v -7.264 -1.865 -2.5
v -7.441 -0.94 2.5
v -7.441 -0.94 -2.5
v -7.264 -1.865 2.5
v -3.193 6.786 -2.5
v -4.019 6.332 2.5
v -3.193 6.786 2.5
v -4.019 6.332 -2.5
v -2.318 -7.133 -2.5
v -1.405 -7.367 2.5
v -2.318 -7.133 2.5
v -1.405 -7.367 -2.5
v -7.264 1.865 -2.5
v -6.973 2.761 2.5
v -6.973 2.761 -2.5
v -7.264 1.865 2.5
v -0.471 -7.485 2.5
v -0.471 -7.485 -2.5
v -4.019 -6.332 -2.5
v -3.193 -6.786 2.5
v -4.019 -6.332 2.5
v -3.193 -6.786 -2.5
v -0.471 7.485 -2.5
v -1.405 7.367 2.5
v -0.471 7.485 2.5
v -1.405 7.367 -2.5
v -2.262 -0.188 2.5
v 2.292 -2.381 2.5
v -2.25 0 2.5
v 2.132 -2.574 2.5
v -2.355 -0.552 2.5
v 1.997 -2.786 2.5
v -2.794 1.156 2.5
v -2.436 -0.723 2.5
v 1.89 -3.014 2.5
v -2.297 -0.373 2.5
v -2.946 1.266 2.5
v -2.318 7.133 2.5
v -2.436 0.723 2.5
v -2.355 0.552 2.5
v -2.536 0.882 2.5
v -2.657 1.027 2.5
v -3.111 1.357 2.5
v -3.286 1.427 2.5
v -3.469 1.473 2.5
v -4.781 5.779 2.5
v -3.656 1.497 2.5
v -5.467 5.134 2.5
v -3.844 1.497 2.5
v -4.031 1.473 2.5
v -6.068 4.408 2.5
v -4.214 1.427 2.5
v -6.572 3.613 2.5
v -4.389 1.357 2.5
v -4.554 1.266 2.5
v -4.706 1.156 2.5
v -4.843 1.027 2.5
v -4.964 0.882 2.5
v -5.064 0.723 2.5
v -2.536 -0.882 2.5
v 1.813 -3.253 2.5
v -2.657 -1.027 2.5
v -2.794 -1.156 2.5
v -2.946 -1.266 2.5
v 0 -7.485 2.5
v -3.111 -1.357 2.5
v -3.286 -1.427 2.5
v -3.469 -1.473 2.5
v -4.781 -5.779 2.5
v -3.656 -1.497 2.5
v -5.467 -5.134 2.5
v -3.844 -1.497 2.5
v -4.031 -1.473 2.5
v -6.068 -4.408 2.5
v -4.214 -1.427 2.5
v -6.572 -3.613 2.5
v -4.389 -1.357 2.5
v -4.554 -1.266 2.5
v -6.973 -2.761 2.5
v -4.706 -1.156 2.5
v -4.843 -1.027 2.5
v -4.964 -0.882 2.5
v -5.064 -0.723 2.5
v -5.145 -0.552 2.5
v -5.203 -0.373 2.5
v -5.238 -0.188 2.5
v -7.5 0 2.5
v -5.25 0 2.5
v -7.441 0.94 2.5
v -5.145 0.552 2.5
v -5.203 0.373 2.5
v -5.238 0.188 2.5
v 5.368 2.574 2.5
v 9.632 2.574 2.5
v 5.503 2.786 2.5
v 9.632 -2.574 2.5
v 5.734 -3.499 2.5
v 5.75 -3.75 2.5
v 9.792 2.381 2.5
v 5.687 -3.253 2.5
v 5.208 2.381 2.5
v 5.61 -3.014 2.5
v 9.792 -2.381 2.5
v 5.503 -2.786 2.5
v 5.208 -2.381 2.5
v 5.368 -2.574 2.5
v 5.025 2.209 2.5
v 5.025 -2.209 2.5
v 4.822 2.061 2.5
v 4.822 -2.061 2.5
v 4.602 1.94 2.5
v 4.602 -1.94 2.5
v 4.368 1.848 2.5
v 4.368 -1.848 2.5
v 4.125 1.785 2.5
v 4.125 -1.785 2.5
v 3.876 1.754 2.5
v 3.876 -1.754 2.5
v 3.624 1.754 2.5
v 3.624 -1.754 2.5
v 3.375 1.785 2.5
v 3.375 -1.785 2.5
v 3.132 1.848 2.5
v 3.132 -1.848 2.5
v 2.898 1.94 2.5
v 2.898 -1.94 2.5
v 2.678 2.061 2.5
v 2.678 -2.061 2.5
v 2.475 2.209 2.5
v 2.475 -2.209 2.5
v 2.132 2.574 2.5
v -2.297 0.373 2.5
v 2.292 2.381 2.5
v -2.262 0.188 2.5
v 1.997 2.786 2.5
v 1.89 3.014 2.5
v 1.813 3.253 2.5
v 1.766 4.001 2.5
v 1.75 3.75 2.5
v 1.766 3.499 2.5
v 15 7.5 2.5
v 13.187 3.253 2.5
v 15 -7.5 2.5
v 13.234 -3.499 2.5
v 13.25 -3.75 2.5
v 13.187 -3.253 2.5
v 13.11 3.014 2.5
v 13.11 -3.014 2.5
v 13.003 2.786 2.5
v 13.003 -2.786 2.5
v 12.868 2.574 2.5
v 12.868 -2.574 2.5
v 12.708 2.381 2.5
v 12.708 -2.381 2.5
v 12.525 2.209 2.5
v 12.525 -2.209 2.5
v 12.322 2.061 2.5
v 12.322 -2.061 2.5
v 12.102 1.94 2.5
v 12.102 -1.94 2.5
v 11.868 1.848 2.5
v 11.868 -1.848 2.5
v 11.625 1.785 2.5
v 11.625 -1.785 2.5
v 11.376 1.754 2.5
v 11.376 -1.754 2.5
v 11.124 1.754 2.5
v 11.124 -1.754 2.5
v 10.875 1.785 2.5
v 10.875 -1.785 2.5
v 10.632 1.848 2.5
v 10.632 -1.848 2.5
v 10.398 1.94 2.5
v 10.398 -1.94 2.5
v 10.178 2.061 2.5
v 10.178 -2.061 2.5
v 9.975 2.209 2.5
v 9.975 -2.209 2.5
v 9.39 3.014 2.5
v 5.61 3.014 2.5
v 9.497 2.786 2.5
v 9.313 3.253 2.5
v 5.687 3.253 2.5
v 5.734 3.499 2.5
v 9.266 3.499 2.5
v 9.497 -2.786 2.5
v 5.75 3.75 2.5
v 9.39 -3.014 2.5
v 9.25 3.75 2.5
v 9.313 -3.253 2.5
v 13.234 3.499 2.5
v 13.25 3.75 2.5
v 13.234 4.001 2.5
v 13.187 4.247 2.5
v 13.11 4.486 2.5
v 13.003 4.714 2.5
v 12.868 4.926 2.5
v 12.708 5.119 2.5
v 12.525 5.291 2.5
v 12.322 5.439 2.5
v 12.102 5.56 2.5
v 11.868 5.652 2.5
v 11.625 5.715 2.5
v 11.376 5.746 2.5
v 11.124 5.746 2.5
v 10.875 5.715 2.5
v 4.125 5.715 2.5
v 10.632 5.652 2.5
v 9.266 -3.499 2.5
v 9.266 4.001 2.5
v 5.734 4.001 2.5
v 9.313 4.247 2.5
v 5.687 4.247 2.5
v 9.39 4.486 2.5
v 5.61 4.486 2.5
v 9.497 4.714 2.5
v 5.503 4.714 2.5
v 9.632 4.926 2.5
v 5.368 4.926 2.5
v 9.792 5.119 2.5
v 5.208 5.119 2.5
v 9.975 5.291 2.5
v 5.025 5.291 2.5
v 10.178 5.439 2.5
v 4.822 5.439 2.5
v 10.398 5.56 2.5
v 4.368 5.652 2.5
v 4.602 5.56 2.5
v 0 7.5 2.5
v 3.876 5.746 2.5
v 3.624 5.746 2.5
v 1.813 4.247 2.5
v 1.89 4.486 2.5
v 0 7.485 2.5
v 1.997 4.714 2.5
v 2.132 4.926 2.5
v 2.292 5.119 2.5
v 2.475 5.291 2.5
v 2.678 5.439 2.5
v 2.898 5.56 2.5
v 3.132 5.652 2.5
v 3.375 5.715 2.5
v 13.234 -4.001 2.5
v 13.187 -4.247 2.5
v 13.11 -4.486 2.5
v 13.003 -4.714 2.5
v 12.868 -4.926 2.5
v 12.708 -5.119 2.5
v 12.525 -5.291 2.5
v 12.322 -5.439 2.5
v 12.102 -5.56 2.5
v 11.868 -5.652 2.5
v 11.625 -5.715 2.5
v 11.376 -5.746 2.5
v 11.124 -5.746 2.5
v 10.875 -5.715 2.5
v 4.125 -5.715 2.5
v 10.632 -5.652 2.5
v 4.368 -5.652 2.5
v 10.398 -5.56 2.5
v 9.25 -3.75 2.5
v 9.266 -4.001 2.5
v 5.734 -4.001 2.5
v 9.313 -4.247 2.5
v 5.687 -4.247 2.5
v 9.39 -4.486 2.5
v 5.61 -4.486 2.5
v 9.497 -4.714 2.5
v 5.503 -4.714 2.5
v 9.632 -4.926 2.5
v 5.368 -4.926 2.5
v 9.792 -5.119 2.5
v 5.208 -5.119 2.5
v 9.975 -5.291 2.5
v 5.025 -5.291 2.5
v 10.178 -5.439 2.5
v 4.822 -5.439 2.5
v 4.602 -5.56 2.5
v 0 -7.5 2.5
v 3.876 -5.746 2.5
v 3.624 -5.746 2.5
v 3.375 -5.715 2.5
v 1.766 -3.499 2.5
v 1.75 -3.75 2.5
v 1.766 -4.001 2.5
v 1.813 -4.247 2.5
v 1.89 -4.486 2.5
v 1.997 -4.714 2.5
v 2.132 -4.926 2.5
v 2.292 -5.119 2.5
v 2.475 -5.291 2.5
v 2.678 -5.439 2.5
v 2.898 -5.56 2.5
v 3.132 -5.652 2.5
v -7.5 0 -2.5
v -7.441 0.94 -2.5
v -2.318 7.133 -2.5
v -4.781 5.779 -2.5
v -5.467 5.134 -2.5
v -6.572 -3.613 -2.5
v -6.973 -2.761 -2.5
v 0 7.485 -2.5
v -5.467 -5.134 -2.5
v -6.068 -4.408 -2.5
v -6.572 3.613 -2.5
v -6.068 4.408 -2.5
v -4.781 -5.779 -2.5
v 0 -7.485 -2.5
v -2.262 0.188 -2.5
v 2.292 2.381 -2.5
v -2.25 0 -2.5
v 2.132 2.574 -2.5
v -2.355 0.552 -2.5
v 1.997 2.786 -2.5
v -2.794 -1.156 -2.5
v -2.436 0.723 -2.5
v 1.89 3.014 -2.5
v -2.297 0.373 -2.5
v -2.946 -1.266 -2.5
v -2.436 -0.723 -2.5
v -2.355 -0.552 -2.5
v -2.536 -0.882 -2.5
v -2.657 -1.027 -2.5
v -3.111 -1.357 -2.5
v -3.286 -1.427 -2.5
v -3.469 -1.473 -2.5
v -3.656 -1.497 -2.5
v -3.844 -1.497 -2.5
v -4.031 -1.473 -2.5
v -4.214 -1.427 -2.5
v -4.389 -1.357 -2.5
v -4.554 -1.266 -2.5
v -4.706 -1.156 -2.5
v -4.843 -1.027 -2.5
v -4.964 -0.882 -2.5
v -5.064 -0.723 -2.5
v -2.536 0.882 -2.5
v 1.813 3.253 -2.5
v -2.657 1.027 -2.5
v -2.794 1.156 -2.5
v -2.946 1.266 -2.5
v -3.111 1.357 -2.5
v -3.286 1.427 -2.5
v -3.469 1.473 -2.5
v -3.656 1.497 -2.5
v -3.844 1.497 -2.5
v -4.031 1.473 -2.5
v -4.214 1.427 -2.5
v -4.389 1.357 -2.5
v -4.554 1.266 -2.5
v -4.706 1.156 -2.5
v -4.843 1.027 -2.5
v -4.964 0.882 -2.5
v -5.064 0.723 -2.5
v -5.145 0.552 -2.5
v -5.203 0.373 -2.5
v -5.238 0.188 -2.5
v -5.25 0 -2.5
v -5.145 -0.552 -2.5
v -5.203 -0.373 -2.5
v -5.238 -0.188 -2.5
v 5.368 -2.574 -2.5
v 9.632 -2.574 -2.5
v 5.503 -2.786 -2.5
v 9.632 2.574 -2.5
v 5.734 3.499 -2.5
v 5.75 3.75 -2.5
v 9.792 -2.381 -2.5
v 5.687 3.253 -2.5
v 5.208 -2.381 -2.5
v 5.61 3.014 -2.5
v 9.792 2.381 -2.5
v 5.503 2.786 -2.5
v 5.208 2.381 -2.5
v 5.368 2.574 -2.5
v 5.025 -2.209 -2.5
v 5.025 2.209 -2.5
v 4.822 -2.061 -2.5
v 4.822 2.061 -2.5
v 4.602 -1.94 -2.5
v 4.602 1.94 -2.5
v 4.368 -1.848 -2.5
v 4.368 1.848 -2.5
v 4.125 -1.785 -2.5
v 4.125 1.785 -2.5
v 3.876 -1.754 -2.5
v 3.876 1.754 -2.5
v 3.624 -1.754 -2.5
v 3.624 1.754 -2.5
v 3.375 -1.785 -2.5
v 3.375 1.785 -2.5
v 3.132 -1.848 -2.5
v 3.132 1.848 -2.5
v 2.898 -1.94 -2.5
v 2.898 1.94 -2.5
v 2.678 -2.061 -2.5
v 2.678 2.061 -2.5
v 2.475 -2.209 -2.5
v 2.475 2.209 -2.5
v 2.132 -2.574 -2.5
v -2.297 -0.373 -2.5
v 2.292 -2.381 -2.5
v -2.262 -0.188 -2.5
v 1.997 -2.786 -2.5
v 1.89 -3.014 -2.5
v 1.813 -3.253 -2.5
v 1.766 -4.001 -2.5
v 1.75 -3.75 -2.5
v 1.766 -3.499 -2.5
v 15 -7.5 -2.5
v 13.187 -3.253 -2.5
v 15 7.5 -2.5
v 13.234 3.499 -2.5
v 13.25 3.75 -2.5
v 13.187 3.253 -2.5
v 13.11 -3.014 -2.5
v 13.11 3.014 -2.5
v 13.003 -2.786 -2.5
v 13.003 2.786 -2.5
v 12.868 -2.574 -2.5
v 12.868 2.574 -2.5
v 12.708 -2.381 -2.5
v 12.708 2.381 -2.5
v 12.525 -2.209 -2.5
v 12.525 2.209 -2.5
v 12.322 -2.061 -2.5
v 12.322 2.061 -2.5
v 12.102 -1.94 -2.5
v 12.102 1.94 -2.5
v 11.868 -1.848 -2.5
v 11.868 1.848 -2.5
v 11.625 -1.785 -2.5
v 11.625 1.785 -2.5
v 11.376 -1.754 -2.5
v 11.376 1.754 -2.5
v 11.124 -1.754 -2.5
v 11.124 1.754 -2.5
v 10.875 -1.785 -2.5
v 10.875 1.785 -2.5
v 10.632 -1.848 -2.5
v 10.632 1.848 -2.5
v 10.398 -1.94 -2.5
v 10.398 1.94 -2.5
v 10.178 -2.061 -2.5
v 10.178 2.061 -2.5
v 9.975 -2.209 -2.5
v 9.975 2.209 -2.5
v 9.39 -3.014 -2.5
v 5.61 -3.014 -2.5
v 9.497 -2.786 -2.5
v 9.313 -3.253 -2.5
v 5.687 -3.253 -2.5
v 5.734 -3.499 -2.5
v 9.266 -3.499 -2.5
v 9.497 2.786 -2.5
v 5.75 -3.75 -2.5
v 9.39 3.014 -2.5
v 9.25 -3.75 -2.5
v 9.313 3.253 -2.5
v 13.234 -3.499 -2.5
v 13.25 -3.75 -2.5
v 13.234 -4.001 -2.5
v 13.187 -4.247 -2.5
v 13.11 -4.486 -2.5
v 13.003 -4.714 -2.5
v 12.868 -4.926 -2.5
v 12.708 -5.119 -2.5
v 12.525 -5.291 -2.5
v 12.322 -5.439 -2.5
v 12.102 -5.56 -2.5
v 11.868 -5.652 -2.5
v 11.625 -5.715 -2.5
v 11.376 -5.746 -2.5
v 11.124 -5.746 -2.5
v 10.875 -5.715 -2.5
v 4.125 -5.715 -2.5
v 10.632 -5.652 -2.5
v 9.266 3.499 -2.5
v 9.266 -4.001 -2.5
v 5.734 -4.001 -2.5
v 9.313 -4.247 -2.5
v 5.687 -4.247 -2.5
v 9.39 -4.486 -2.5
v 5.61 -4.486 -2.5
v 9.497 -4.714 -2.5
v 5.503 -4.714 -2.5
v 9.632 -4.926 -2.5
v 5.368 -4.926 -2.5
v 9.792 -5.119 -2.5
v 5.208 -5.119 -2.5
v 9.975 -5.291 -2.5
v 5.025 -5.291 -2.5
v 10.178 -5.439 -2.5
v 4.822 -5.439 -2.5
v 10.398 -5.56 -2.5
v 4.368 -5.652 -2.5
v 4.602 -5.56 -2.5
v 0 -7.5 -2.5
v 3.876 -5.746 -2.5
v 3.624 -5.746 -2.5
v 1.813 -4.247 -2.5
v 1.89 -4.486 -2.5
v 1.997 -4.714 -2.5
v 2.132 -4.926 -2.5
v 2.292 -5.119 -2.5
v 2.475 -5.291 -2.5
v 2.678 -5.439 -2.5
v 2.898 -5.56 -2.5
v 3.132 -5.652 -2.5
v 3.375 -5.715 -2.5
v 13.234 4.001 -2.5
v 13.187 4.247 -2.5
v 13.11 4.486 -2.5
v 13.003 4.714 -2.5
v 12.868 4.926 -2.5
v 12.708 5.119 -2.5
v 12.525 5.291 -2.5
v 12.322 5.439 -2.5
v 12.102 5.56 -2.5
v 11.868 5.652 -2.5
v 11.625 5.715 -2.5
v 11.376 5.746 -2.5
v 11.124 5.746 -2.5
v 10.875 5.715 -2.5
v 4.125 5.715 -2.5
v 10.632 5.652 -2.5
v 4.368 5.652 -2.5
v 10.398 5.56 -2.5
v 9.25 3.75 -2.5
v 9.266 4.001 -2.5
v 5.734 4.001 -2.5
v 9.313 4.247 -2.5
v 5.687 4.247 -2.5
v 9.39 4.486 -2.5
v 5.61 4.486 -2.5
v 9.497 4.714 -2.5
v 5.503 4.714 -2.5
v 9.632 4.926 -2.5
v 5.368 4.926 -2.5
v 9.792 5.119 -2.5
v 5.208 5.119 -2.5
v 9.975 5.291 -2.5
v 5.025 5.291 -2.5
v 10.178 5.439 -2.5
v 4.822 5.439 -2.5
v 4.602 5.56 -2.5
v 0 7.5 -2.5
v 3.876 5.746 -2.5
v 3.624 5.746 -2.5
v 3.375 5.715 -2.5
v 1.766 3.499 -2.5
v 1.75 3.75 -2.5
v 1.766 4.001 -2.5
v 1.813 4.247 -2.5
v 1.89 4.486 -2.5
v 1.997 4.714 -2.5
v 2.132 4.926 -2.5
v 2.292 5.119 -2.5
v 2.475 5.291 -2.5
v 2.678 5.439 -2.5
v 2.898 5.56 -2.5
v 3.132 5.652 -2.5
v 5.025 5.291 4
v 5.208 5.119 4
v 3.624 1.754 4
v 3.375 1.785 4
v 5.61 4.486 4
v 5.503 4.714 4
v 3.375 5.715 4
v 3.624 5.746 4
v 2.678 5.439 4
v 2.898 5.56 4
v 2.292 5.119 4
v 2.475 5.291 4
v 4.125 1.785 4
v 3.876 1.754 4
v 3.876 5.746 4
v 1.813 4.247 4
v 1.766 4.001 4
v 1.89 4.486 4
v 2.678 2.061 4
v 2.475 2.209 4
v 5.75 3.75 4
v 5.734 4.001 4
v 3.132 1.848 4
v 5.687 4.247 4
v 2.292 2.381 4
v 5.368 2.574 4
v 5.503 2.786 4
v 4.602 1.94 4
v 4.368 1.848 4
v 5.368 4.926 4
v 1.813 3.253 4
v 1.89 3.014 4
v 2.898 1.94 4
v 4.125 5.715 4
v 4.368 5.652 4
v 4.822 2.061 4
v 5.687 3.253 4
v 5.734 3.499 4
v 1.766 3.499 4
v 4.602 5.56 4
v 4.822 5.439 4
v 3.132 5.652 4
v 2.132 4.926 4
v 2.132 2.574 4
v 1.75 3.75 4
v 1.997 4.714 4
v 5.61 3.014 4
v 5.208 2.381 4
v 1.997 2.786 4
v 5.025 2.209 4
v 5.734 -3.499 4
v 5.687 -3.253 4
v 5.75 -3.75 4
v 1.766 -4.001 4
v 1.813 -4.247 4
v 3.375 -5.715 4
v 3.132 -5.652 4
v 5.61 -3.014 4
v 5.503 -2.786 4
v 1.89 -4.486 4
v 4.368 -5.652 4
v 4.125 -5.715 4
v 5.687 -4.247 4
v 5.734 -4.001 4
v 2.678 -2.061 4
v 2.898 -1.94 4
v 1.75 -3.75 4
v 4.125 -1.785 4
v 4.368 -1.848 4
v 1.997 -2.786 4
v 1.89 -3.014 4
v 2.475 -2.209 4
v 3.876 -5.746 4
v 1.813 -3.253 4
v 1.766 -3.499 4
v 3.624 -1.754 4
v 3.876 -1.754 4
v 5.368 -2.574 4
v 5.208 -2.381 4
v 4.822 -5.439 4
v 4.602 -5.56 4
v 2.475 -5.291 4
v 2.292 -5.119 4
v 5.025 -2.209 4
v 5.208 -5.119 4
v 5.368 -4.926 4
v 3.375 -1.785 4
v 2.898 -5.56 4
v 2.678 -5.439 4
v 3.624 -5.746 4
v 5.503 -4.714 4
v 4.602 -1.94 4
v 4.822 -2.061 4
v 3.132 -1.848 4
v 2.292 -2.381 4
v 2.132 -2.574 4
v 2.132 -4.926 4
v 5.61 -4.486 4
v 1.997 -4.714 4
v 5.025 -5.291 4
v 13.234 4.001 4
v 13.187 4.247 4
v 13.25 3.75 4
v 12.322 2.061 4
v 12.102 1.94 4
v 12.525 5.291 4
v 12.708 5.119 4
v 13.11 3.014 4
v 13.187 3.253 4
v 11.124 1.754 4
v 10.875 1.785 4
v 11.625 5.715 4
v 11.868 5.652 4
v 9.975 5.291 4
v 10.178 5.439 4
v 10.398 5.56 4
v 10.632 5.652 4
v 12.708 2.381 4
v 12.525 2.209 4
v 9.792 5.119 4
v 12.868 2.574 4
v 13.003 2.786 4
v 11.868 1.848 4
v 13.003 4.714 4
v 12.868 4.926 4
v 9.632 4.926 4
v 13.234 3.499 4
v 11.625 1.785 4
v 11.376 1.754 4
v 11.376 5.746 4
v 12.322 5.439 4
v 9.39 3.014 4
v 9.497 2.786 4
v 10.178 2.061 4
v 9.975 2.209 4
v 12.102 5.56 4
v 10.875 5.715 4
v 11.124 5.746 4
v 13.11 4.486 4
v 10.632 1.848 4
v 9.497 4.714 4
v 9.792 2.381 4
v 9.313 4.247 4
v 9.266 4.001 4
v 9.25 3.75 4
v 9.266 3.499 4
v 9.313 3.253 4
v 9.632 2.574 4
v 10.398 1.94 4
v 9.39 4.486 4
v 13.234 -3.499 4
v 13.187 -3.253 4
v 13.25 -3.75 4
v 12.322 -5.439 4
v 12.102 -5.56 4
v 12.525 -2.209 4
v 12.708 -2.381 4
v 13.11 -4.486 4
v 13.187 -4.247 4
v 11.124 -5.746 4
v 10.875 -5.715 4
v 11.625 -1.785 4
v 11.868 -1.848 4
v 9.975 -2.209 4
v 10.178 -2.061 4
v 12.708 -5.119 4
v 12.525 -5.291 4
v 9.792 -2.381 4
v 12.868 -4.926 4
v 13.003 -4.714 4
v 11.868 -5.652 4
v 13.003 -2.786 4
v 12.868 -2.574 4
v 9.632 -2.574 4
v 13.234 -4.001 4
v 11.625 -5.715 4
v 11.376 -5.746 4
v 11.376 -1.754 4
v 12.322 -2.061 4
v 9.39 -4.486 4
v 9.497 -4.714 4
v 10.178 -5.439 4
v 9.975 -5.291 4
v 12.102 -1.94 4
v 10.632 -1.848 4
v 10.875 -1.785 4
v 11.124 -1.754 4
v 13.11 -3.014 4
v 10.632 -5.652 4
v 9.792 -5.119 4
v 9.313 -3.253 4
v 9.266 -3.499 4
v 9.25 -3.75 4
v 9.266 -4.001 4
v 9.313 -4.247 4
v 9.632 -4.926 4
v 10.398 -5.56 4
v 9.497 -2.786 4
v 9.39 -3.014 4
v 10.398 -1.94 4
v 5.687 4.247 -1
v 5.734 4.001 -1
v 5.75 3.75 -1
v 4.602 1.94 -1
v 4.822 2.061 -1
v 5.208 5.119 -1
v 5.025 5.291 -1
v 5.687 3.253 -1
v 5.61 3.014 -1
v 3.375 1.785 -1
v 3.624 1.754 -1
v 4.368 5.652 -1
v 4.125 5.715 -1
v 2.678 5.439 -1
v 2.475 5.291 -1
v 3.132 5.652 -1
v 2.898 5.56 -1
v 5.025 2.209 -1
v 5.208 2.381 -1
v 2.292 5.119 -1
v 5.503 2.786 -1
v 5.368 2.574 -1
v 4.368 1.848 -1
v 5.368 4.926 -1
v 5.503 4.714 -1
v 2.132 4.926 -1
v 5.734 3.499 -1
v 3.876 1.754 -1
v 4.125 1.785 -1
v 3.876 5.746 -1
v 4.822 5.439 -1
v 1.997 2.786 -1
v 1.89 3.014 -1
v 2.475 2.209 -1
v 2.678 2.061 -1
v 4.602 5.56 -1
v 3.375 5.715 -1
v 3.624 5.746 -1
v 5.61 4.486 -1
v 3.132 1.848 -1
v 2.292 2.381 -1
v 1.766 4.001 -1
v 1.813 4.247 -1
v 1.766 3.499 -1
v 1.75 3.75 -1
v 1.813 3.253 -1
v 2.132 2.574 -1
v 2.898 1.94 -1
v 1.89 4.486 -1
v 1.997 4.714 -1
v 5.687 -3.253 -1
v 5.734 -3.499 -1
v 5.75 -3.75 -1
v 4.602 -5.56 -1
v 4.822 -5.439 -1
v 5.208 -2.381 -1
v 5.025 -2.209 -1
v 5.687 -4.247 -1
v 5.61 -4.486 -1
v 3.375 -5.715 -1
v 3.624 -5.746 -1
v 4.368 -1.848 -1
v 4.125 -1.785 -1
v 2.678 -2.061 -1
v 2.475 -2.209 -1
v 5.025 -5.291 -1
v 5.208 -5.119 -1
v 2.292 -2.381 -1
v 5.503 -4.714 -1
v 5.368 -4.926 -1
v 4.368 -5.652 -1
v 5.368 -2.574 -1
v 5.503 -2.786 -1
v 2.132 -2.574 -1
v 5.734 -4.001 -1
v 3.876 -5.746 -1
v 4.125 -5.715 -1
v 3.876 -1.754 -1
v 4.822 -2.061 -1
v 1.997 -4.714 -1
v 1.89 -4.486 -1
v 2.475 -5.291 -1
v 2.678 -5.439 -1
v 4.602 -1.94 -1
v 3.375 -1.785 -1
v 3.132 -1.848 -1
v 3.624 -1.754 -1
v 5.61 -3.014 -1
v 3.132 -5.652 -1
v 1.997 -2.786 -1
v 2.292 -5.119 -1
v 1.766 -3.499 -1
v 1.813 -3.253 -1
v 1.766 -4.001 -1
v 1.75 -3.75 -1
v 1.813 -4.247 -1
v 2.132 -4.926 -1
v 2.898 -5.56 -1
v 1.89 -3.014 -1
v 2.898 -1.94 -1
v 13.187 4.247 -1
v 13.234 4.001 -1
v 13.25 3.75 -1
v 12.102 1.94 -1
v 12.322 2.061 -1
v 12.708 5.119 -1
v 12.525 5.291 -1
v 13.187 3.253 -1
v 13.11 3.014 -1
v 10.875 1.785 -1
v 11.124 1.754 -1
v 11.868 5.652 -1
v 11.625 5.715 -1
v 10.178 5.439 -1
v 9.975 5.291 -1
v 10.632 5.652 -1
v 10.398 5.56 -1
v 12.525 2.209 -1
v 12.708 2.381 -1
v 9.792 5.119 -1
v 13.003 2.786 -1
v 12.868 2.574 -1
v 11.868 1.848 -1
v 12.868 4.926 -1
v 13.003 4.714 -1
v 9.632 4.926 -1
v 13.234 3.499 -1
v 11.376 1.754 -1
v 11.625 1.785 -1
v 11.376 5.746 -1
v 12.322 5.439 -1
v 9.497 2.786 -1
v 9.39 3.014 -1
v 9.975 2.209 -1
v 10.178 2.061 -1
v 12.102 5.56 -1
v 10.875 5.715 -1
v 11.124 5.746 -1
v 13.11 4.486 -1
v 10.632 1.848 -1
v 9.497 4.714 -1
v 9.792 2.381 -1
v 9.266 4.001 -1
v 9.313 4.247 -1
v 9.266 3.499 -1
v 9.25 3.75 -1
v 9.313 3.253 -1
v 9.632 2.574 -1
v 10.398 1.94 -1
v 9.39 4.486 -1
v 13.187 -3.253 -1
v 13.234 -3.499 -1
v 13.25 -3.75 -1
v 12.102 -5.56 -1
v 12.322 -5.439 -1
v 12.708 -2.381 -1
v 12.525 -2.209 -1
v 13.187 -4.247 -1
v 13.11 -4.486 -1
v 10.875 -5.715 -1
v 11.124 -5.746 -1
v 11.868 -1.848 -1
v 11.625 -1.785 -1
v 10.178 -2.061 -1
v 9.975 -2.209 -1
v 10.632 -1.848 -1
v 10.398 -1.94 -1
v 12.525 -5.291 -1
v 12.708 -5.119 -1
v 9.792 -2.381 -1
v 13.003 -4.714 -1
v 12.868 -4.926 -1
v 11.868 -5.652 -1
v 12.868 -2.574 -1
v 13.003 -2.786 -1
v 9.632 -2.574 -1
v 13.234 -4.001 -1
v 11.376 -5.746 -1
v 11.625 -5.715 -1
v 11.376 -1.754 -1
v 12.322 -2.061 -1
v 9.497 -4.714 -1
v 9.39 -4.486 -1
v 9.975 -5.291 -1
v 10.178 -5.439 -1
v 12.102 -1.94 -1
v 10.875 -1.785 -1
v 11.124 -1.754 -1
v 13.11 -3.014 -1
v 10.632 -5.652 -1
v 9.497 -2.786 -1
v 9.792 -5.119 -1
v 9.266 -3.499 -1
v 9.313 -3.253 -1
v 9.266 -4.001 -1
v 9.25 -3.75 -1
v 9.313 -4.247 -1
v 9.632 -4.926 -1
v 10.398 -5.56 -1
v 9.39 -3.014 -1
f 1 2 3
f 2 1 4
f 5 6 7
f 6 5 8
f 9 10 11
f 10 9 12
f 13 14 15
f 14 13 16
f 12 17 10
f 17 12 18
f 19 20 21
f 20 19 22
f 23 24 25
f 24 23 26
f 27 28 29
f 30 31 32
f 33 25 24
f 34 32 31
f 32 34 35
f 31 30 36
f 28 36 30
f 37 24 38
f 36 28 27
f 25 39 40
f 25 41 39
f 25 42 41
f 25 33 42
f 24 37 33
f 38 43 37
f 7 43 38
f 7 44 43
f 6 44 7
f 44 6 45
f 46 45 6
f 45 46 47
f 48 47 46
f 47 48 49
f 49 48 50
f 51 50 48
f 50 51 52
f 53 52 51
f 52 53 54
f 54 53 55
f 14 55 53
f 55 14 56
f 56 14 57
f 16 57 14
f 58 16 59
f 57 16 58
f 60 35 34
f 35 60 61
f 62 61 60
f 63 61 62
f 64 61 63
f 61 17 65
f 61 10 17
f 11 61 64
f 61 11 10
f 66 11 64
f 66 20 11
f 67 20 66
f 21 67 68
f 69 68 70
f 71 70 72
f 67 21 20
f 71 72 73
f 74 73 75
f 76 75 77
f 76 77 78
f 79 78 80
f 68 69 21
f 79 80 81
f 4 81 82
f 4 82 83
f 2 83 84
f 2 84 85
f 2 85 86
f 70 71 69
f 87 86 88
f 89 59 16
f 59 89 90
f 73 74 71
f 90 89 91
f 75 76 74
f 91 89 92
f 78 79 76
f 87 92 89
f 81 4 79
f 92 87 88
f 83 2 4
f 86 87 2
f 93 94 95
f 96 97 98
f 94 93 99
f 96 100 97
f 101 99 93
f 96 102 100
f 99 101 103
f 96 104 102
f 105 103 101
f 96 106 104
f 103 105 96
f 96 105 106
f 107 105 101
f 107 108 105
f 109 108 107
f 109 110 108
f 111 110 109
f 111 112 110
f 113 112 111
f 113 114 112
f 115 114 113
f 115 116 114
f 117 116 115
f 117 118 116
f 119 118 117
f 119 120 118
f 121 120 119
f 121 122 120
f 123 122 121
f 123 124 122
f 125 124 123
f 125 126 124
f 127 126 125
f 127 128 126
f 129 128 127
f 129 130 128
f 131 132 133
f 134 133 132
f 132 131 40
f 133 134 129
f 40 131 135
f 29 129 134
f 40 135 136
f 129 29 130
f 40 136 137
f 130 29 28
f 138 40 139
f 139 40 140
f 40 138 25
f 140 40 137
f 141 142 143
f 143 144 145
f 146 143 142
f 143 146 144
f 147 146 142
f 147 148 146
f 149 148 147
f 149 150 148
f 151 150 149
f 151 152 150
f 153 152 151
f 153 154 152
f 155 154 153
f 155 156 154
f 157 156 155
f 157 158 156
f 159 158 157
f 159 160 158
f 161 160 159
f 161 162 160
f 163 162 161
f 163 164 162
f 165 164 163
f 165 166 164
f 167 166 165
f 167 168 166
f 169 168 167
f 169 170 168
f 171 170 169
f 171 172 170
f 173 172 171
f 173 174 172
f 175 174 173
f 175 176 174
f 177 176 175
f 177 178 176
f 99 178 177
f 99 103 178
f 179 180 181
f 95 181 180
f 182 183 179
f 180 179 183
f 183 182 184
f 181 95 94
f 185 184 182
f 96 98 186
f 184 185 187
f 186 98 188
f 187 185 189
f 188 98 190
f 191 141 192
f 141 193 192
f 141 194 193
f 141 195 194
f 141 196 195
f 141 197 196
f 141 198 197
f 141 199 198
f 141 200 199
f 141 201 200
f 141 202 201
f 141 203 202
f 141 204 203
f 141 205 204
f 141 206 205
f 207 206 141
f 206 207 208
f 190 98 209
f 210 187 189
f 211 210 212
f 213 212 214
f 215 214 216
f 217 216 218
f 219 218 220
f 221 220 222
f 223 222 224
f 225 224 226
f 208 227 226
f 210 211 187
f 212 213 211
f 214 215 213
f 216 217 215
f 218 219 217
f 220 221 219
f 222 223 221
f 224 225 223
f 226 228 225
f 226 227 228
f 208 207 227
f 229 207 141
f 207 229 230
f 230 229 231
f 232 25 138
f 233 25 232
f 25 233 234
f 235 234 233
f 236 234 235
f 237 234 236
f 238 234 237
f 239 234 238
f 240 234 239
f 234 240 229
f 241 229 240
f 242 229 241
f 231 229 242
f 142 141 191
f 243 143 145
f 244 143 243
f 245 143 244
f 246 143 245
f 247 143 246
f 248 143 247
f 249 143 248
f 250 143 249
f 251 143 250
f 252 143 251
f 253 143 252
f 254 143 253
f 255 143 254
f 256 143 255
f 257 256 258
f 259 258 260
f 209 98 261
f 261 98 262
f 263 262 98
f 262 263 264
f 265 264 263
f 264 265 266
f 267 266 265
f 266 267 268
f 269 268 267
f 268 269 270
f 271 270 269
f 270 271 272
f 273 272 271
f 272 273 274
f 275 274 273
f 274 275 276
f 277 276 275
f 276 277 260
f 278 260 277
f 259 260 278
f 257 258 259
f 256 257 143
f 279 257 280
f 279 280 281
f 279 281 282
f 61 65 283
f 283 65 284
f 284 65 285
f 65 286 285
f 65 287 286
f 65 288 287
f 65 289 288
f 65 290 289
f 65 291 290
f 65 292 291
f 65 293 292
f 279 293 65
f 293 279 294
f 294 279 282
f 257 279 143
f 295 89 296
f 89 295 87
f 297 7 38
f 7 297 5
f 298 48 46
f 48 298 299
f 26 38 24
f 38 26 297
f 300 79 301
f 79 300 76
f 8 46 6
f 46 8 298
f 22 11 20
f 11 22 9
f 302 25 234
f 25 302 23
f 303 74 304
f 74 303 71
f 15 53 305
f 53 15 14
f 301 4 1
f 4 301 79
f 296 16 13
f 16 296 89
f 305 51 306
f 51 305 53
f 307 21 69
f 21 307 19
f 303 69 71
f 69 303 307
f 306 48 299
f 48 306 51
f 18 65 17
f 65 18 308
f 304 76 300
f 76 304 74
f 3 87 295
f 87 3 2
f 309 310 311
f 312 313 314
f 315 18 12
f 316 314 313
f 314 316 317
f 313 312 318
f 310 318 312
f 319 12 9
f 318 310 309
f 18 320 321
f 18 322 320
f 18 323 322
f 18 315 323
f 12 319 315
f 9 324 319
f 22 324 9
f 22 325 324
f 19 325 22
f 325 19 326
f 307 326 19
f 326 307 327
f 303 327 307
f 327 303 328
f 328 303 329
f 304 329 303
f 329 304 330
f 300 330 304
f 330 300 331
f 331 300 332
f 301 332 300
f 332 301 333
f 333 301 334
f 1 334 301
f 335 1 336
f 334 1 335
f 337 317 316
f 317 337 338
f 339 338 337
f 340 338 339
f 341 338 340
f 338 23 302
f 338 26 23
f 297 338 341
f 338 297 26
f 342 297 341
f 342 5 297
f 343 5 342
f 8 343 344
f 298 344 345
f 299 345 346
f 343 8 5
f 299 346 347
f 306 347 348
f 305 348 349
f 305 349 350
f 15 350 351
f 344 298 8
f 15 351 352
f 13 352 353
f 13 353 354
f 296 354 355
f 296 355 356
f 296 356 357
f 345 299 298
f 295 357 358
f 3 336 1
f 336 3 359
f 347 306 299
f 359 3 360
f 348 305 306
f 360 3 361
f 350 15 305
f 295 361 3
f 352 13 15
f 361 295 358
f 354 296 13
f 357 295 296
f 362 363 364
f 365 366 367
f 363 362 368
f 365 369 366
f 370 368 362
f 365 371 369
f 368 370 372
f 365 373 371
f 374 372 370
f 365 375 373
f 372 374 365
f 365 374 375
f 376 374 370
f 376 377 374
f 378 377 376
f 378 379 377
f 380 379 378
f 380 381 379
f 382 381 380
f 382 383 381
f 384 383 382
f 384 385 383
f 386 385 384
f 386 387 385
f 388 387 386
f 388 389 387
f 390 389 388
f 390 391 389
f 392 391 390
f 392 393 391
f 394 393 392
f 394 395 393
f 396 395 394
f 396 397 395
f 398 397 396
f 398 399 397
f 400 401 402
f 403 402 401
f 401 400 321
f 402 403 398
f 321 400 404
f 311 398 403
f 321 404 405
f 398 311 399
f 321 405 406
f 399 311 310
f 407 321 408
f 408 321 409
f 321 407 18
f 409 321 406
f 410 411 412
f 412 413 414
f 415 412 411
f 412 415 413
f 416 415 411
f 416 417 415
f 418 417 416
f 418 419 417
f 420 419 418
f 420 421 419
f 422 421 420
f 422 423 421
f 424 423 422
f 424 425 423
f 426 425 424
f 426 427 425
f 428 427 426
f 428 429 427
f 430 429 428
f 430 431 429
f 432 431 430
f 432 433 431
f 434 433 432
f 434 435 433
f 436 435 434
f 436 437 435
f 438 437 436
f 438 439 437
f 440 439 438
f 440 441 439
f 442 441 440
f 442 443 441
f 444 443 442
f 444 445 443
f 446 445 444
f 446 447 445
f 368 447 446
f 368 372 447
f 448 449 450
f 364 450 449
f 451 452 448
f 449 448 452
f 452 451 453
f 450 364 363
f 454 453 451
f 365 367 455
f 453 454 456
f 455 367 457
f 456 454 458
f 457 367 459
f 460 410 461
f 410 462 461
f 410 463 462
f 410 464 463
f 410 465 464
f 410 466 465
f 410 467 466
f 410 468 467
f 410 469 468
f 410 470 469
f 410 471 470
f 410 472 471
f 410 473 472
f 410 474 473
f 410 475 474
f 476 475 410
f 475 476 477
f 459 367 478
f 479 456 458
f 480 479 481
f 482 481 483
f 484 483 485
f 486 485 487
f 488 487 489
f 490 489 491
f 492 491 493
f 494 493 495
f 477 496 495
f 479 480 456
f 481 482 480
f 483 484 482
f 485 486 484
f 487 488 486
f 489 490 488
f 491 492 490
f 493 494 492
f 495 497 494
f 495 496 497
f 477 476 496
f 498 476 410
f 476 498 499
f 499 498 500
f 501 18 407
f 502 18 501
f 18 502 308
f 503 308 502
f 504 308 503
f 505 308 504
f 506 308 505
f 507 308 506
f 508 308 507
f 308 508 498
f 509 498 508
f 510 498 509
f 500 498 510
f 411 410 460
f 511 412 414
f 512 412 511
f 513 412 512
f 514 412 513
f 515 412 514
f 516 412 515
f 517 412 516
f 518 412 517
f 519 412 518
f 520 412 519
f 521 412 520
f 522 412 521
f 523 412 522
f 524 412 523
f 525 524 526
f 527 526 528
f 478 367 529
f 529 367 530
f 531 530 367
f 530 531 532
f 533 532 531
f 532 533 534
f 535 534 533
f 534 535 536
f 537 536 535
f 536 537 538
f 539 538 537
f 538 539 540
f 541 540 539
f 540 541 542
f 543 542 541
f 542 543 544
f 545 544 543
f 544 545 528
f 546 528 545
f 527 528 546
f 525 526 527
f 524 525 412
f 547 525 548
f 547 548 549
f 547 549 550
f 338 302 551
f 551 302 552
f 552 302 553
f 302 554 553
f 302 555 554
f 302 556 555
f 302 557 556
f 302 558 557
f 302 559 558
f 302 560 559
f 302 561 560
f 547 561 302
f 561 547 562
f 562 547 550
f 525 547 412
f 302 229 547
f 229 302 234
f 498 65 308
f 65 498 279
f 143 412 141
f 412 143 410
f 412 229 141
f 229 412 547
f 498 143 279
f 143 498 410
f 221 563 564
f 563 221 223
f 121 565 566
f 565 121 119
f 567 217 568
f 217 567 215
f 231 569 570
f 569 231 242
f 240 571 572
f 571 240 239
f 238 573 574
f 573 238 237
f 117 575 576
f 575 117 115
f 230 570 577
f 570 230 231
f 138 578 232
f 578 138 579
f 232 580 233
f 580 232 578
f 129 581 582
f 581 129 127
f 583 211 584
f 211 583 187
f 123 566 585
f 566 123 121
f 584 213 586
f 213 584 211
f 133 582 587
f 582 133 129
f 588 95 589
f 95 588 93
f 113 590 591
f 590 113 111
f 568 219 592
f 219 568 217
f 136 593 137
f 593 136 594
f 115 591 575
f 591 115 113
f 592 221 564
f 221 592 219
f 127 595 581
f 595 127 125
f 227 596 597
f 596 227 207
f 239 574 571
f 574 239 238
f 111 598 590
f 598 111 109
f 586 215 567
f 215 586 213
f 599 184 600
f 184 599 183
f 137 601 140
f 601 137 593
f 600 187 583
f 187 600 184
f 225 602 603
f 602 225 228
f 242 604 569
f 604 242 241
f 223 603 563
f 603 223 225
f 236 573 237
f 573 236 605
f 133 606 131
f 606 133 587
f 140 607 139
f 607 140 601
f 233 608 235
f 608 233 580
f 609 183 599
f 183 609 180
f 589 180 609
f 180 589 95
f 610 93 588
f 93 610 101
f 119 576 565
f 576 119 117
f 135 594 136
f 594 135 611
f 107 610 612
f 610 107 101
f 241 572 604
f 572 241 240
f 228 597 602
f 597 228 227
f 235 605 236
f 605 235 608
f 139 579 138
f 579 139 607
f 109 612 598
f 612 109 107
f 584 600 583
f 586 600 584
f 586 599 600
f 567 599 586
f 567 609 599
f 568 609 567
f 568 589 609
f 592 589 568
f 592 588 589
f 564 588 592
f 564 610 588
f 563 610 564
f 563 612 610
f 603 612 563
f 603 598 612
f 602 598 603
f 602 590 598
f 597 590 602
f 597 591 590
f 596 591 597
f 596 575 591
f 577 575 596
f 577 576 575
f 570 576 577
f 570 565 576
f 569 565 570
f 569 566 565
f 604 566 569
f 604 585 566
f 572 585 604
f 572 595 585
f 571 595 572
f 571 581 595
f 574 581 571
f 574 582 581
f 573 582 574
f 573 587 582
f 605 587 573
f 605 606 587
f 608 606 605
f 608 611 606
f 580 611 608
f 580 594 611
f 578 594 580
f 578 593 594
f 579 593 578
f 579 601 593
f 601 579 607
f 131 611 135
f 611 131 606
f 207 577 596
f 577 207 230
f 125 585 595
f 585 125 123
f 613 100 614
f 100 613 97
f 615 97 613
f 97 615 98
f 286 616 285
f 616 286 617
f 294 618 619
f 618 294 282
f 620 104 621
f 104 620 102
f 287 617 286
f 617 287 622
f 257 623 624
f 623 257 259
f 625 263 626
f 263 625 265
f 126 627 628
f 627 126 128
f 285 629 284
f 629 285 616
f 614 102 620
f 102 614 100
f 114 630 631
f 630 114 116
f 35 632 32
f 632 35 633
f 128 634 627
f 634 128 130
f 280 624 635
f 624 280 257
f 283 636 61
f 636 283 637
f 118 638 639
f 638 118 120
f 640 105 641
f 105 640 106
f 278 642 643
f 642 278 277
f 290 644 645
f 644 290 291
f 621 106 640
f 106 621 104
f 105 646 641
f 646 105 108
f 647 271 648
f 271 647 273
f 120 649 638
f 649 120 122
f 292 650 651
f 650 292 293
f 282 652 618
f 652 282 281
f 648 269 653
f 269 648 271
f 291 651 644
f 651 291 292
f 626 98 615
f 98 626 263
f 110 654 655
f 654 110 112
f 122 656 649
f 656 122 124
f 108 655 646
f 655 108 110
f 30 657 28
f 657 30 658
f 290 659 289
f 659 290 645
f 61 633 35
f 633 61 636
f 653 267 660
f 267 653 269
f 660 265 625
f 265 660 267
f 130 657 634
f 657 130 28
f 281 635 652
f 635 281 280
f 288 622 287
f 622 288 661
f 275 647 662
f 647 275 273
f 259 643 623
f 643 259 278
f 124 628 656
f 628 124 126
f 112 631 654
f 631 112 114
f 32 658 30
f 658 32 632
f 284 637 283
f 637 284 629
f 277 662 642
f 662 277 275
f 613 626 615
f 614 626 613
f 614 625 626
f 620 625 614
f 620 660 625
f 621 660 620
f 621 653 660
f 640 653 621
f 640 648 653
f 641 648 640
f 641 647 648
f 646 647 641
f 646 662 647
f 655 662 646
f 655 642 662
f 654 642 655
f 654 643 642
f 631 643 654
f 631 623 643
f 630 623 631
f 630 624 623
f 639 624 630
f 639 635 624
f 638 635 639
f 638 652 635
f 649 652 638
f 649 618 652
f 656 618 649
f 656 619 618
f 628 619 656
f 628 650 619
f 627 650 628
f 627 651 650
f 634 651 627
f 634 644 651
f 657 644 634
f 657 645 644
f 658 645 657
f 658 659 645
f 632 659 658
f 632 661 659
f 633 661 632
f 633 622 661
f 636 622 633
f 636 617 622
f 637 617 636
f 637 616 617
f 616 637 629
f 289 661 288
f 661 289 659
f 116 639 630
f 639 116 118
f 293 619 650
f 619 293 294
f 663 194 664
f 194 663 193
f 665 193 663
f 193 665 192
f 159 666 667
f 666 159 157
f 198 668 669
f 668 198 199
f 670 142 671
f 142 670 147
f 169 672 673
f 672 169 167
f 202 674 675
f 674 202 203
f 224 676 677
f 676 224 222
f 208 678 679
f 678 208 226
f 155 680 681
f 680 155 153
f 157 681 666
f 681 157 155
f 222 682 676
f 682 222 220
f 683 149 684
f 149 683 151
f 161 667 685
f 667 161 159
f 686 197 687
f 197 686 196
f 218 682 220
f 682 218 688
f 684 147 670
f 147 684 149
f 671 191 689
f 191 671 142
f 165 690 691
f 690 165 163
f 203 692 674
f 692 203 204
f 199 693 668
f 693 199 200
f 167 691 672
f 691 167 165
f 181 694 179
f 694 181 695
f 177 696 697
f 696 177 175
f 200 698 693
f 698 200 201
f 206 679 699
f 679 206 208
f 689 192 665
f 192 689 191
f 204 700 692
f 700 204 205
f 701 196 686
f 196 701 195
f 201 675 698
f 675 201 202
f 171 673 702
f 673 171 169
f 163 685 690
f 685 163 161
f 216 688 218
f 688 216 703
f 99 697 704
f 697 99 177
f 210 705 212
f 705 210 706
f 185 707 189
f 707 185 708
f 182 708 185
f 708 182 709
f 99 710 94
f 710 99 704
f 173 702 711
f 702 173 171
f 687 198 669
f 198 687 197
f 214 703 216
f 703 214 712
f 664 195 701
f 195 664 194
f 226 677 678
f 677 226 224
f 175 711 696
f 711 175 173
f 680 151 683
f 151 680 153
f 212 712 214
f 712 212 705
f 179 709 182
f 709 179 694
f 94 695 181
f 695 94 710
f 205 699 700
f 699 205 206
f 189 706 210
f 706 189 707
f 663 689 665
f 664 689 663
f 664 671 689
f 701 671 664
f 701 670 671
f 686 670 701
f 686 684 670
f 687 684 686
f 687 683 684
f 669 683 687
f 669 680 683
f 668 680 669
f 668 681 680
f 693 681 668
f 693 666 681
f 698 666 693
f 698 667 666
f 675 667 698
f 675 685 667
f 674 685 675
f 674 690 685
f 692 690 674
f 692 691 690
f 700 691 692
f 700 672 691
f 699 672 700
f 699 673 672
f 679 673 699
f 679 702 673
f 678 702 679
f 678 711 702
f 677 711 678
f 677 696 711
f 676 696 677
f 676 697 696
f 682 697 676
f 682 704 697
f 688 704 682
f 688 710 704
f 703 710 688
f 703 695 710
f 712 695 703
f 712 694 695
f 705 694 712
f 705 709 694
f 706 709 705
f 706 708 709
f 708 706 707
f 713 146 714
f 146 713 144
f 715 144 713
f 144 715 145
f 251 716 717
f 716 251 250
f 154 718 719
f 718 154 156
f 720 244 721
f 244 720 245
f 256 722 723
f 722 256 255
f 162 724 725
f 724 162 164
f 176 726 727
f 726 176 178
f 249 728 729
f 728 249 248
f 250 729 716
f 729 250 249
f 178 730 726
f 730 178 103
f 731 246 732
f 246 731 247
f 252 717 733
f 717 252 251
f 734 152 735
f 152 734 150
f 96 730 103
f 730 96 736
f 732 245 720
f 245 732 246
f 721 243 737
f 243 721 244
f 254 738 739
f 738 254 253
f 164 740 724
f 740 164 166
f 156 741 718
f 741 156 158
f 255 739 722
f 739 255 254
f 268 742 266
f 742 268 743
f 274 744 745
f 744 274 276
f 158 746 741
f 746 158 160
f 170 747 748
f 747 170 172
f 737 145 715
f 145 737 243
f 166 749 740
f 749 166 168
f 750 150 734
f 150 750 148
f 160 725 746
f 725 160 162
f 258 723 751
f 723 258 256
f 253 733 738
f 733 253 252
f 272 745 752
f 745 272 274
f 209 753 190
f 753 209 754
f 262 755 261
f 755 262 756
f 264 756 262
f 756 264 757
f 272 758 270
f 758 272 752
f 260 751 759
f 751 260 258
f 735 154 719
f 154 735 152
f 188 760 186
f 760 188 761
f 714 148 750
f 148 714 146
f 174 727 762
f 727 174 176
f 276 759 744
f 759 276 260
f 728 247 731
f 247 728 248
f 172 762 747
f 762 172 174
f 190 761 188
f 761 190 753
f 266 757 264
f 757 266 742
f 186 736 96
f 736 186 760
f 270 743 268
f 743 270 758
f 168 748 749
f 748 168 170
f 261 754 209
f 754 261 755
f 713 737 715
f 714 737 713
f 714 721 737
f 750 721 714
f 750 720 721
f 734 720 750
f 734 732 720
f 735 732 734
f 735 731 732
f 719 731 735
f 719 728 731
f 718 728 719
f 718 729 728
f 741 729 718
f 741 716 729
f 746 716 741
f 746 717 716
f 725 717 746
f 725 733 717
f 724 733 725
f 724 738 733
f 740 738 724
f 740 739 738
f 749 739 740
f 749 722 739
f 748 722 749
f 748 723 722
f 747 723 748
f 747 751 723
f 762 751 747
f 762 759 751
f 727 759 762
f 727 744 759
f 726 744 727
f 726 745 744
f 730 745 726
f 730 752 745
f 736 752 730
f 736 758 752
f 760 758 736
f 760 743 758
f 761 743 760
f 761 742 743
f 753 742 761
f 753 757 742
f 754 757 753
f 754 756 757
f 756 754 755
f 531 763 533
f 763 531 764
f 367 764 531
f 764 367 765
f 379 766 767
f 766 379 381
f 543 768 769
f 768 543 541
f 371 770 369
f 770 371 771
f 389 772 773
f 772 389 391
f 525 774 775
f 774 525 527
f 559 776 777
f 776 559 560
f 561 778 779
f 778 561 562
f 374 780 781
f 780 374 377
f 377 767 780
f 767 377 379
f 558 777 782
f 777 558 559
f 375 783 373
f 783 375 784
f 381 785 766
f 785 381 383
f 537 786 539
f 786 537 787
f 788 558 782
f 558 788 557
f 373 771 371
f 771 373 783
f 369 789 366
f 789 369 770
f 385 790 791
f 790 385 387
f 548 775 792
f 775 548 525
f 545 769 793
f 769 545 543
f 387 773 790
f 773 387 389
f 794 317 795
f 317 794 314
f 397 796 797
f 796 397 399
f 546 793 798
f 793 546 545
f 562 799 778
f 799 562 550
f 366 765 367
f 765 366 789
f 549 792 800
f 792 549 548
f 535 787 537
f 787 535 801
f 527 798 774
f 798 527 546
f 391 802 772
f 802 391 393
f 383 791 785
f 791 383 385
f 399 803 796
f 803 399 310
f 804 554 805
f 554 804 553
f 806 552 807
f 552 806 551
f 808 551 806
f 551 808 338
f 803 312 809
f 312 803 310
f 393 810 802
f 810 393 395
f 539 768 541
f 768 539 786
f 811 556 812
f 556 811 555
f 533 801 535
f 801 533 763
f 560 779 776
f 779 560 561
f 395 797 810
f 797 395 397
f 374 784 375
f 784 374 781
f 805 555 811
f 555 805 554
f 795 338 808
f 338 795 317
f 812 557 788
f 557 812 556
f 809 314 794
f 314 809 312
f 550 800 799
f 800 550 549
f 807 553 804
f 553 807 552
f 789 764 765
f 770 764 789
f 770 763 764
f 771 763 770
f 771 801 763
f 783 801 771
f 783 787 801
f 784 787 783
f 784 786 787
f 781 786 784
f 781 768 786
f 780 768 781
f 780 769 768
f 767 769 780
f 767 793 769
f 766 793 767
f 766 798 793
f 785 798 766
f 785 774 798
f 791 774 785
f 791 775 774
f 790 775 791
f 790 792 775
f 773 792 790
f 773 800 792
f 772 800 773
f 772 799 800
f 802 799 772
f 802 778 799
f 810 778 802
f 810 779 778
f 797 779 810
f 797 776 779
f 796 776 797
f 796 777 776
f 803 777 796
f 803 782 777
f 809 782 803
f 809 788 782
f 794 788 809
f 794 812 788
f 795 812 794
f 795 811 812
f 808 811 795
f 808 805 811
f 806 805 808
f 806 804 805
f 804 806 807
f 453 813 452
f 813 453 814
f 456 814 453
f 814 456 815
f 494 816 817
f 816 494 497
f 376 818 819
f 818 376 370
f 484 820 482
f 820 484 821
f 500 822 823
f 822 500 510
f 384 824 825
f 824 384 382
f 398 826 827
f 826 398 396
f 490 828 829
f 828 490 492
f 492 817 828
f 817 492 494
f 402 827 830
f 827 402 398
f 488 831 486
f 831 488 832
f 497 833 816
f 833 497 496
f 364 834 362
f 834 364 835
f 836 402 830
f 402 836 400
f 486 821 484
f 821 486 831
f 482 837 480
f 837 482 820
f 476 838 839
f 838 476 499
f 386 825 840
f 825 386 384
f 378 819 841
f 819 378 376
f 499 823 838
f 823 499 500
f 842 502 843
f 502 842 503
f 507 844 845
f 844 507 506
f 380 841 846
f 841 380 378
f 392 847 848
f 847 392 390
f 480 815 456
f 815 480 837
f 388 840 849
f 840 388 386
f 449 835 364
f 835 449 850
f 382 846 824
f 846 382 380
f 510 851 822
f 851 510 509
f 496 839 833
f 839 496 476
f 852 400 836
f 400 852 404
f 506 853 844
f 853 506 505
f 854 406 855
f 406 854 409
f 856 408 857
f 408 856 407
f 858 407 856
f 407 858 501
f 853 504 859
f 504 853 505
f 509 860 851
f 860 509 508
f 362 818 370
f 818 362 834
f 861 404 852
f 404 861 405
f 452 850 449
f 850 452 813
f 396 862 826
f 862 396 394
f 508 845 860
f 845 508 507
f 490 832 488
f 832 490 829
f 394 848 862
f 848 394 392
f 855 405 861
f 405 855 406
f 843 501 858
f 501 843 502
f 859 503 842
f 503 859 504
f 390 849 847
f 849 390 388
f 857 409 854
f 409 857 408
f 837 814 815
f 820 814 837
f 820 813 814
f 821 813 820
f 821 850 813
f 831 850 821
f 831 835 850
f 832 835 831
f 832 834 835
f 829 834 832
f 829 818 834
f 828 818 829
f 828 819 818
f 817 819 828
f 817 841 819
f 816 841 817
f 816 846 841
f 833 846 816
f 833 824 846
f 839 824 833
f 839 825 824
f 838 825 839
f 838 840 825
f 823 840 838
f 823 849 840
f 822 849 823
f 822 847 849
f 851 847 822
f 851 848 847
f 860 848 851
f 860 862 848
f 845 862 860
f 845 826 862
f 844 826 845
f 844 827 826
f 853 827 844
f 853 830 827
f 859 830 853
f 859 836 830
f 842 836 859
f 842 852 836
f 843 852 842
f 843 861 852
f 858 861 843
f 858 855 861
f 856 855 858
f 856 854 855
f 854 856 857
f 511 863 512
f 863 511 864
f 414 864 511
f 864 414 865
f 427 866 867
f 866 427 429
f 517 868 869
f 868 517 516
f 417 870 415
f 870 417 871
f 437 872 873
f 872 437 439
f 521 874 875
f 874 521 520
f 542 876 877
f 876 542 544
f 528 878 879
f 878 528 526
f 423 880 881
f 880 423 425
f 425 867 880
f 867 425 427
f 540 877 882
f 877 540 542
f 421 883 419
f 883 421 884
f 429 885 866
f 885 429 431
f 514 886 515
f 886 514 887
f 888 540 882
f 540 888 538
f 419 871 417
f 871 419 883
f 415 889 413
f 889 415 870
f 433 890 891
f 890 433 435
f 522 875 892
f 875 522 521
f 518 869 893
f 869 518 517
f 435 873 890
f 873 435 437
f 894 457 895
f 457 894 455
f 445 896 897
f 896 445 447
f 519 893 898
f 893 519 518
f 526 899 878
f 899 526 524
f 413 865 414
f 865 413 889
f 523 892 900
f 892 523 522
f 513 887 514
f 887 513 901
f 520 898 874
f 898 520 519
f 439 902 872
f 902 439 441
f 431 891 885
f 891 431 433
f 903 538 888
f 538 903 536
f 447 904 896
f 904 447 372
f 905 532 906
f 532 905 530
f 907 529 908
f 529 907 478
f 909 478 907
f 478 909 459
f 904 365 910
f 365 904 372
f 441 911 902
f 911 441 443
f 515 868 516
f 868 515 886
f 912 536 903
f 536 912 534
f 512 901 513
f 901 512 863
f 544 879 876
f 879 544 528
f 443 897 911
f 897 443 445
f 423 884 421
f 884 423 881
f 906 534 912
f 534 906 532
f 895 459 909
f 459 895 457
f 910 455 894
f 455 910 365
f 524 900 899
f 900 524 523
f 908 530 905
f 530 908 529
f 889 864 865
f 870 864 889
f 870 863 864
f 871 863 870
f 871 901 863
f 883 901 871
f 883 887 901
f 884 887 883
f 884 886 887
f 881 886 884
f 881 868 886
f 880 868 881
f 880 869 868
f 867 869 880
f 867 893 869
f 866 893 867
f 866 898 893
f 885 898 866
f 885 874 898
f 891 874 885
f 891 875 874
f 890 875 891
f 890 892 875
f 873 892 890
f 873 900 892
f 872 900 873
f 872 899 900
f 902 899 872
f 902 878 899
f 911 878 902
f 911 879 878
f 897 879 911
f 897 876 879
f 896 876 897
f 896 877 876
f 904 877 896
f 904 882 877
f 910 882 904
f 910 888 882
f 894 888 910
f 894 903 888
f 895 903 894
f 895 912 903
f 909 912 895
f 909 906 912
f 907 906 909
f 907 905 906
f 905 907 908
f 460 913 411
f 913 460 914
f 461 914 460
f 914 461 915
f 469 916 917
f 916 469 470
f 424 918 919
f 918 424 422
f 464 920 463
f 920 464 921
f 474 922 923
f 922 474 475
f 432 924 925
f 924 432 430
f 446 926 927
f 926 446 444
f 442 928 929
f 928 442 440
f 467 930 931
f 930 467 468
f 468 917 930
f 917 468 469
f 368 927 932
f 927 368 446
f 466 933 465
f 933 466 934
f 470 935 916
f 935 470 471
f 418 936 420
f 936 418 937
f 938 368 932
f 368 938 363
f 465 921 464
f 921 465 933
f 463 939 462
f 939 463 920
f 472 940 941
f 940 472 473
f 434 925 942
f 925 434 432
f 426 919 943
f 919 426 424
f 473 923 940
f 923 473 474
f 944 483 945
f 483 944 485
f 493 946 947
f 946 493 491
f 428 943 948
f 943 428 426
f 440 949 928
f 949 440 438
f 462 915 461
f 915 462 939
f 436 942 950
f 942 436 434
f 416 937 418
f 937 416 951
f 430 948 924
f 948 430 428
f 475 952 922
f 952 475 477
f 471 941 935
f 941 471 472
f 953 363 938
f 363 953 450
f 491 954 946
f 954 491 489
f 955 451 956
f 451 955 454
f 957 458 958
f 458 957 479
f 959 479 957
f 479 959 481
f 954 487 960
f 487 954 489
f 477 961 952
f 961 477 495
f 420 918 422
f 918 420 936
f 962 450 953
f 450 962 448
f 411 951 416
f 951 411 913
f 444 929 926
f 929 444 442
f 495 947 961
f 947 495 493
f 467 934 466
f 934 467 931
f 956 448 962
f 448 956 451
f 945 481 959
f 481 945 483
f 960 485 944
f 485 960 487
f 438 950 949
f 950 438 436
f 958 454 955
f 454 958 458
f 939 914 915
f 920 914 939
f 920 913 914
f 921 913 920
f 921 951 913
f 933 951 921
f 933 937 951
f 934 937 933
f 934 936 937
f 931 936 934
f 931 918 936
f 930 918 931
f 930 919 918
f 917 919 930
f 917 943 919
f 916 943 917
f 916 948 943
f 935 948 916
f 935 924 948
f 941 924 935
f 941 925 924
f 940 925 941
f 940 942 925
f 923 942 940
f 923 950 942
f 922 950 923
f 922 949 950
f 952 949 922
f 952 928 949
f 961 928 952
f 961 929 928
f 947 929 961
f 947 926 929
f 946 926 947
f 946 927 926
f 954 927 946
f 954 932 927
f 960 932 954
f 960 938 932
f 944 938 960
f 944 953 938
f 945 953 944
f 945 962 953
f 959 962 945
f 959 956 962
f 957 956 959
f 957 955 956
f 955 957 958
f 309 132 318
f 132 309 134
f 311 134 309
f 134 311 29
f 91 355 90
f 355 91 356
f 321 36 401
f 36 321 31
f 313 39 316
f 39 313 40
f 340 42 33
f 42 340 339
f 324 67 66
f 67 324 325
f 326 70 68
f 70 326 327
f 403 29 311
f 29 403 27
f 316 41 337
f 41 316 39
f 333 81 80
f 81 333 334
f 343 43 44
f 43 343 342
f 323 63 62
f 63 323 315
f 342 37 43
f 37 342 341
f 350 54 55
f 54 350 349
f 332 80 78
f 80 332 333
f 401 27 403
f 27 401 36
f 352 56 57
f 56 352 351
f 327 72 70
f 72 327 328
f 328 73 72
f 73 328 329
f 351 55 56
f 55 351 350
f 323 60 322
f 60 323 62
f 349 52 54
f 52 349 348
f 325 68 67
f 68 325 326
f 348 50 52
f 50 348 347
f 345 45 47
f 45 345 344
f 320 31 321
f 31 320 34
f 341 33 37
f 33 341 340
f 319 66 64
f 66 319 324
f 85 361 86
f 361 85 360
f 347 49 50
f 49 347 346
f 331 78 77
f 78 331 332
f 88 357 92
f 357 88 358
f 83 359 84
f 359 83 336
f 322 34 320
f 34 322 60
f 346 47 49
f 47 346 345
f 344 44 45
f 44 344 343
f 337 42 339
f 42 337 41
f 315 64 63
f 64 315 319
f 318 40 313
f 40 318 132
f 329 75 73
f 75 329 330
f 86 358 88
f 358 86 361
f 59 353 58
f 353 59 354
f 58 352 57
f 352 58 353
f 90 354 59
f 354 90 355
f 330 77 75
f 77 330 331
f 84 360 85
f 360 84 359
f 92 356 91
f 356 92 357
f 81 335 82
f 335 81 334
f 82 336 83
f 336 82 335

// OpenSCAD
//Size on the y-Axis in mm
size = 15;

//Size on the z-Axis in mm
height = 5;

module half(){
	difference(){
		cylinder(r=size/2,h=height,$fn=50, center=true);
		translate([(size+1)/2,0,0]) cube([size + 1, size + 1,height + 1],center = true);
	}
}

module plate(){
	union() {
		half();
		translate([0,-size/2,-height/2]) cube([size,size,height]);
	}
}

//Top Knob Diameter
knob_diameter = 4;

//Top Knob Hight
knob_hight = 1.5;

//Bottom Hole Diameter
hole_diameter = 4;

//Bottom Hole Depth
hole_depth = 1.5;

//Keyring Hole Diameter
keyring_hole=1.5;

difference(){
	union(){
		plate();
		translate([size/4, size/4 , height/2]) cylinder(r=knob_diameter/2,h=knob_hight,$fn=50);
		translate([size/4, -size/4, height/2]) cylinder(r=knob_diameter/2,h=knob_hight,$fn=50);
		translate([3*(size/4), size/4, height/2]) cylinder(r=knob_diameter/2,h=knob_hight,$fn=50);
		translate([3*(size/4),-size/4, height/2]) cylinder(r=knob_diameter/2,h=knob_hight,$fn=50);
	}
	translate([size/4,size/4,-height/2-0.01]) cylinder(r=hole_diameter/2,h=hole_depth+0.01,$fn=50);
	translate([size/4,-size/4,-height/2-0.01]) cylinder(r=hole_diameter/2,h=hole_depth+0.01,$fn=50);
	translate([3*(size/4),size/4,-height/2-0.01]) cylinder(r=hole_diameter/2,h=hole_depth+0.01,$fn=50);
	translate([3*(size/4),-size/4,-height/2-0.01]) cylinder(r=hole_diameter/2,h=hole_depth+0.01,$fn=50);
	translate([-size/4,0,-height/2-0.01]) cylinder(r=keyring_hole, h=height+0.02, $fn=50);
}
